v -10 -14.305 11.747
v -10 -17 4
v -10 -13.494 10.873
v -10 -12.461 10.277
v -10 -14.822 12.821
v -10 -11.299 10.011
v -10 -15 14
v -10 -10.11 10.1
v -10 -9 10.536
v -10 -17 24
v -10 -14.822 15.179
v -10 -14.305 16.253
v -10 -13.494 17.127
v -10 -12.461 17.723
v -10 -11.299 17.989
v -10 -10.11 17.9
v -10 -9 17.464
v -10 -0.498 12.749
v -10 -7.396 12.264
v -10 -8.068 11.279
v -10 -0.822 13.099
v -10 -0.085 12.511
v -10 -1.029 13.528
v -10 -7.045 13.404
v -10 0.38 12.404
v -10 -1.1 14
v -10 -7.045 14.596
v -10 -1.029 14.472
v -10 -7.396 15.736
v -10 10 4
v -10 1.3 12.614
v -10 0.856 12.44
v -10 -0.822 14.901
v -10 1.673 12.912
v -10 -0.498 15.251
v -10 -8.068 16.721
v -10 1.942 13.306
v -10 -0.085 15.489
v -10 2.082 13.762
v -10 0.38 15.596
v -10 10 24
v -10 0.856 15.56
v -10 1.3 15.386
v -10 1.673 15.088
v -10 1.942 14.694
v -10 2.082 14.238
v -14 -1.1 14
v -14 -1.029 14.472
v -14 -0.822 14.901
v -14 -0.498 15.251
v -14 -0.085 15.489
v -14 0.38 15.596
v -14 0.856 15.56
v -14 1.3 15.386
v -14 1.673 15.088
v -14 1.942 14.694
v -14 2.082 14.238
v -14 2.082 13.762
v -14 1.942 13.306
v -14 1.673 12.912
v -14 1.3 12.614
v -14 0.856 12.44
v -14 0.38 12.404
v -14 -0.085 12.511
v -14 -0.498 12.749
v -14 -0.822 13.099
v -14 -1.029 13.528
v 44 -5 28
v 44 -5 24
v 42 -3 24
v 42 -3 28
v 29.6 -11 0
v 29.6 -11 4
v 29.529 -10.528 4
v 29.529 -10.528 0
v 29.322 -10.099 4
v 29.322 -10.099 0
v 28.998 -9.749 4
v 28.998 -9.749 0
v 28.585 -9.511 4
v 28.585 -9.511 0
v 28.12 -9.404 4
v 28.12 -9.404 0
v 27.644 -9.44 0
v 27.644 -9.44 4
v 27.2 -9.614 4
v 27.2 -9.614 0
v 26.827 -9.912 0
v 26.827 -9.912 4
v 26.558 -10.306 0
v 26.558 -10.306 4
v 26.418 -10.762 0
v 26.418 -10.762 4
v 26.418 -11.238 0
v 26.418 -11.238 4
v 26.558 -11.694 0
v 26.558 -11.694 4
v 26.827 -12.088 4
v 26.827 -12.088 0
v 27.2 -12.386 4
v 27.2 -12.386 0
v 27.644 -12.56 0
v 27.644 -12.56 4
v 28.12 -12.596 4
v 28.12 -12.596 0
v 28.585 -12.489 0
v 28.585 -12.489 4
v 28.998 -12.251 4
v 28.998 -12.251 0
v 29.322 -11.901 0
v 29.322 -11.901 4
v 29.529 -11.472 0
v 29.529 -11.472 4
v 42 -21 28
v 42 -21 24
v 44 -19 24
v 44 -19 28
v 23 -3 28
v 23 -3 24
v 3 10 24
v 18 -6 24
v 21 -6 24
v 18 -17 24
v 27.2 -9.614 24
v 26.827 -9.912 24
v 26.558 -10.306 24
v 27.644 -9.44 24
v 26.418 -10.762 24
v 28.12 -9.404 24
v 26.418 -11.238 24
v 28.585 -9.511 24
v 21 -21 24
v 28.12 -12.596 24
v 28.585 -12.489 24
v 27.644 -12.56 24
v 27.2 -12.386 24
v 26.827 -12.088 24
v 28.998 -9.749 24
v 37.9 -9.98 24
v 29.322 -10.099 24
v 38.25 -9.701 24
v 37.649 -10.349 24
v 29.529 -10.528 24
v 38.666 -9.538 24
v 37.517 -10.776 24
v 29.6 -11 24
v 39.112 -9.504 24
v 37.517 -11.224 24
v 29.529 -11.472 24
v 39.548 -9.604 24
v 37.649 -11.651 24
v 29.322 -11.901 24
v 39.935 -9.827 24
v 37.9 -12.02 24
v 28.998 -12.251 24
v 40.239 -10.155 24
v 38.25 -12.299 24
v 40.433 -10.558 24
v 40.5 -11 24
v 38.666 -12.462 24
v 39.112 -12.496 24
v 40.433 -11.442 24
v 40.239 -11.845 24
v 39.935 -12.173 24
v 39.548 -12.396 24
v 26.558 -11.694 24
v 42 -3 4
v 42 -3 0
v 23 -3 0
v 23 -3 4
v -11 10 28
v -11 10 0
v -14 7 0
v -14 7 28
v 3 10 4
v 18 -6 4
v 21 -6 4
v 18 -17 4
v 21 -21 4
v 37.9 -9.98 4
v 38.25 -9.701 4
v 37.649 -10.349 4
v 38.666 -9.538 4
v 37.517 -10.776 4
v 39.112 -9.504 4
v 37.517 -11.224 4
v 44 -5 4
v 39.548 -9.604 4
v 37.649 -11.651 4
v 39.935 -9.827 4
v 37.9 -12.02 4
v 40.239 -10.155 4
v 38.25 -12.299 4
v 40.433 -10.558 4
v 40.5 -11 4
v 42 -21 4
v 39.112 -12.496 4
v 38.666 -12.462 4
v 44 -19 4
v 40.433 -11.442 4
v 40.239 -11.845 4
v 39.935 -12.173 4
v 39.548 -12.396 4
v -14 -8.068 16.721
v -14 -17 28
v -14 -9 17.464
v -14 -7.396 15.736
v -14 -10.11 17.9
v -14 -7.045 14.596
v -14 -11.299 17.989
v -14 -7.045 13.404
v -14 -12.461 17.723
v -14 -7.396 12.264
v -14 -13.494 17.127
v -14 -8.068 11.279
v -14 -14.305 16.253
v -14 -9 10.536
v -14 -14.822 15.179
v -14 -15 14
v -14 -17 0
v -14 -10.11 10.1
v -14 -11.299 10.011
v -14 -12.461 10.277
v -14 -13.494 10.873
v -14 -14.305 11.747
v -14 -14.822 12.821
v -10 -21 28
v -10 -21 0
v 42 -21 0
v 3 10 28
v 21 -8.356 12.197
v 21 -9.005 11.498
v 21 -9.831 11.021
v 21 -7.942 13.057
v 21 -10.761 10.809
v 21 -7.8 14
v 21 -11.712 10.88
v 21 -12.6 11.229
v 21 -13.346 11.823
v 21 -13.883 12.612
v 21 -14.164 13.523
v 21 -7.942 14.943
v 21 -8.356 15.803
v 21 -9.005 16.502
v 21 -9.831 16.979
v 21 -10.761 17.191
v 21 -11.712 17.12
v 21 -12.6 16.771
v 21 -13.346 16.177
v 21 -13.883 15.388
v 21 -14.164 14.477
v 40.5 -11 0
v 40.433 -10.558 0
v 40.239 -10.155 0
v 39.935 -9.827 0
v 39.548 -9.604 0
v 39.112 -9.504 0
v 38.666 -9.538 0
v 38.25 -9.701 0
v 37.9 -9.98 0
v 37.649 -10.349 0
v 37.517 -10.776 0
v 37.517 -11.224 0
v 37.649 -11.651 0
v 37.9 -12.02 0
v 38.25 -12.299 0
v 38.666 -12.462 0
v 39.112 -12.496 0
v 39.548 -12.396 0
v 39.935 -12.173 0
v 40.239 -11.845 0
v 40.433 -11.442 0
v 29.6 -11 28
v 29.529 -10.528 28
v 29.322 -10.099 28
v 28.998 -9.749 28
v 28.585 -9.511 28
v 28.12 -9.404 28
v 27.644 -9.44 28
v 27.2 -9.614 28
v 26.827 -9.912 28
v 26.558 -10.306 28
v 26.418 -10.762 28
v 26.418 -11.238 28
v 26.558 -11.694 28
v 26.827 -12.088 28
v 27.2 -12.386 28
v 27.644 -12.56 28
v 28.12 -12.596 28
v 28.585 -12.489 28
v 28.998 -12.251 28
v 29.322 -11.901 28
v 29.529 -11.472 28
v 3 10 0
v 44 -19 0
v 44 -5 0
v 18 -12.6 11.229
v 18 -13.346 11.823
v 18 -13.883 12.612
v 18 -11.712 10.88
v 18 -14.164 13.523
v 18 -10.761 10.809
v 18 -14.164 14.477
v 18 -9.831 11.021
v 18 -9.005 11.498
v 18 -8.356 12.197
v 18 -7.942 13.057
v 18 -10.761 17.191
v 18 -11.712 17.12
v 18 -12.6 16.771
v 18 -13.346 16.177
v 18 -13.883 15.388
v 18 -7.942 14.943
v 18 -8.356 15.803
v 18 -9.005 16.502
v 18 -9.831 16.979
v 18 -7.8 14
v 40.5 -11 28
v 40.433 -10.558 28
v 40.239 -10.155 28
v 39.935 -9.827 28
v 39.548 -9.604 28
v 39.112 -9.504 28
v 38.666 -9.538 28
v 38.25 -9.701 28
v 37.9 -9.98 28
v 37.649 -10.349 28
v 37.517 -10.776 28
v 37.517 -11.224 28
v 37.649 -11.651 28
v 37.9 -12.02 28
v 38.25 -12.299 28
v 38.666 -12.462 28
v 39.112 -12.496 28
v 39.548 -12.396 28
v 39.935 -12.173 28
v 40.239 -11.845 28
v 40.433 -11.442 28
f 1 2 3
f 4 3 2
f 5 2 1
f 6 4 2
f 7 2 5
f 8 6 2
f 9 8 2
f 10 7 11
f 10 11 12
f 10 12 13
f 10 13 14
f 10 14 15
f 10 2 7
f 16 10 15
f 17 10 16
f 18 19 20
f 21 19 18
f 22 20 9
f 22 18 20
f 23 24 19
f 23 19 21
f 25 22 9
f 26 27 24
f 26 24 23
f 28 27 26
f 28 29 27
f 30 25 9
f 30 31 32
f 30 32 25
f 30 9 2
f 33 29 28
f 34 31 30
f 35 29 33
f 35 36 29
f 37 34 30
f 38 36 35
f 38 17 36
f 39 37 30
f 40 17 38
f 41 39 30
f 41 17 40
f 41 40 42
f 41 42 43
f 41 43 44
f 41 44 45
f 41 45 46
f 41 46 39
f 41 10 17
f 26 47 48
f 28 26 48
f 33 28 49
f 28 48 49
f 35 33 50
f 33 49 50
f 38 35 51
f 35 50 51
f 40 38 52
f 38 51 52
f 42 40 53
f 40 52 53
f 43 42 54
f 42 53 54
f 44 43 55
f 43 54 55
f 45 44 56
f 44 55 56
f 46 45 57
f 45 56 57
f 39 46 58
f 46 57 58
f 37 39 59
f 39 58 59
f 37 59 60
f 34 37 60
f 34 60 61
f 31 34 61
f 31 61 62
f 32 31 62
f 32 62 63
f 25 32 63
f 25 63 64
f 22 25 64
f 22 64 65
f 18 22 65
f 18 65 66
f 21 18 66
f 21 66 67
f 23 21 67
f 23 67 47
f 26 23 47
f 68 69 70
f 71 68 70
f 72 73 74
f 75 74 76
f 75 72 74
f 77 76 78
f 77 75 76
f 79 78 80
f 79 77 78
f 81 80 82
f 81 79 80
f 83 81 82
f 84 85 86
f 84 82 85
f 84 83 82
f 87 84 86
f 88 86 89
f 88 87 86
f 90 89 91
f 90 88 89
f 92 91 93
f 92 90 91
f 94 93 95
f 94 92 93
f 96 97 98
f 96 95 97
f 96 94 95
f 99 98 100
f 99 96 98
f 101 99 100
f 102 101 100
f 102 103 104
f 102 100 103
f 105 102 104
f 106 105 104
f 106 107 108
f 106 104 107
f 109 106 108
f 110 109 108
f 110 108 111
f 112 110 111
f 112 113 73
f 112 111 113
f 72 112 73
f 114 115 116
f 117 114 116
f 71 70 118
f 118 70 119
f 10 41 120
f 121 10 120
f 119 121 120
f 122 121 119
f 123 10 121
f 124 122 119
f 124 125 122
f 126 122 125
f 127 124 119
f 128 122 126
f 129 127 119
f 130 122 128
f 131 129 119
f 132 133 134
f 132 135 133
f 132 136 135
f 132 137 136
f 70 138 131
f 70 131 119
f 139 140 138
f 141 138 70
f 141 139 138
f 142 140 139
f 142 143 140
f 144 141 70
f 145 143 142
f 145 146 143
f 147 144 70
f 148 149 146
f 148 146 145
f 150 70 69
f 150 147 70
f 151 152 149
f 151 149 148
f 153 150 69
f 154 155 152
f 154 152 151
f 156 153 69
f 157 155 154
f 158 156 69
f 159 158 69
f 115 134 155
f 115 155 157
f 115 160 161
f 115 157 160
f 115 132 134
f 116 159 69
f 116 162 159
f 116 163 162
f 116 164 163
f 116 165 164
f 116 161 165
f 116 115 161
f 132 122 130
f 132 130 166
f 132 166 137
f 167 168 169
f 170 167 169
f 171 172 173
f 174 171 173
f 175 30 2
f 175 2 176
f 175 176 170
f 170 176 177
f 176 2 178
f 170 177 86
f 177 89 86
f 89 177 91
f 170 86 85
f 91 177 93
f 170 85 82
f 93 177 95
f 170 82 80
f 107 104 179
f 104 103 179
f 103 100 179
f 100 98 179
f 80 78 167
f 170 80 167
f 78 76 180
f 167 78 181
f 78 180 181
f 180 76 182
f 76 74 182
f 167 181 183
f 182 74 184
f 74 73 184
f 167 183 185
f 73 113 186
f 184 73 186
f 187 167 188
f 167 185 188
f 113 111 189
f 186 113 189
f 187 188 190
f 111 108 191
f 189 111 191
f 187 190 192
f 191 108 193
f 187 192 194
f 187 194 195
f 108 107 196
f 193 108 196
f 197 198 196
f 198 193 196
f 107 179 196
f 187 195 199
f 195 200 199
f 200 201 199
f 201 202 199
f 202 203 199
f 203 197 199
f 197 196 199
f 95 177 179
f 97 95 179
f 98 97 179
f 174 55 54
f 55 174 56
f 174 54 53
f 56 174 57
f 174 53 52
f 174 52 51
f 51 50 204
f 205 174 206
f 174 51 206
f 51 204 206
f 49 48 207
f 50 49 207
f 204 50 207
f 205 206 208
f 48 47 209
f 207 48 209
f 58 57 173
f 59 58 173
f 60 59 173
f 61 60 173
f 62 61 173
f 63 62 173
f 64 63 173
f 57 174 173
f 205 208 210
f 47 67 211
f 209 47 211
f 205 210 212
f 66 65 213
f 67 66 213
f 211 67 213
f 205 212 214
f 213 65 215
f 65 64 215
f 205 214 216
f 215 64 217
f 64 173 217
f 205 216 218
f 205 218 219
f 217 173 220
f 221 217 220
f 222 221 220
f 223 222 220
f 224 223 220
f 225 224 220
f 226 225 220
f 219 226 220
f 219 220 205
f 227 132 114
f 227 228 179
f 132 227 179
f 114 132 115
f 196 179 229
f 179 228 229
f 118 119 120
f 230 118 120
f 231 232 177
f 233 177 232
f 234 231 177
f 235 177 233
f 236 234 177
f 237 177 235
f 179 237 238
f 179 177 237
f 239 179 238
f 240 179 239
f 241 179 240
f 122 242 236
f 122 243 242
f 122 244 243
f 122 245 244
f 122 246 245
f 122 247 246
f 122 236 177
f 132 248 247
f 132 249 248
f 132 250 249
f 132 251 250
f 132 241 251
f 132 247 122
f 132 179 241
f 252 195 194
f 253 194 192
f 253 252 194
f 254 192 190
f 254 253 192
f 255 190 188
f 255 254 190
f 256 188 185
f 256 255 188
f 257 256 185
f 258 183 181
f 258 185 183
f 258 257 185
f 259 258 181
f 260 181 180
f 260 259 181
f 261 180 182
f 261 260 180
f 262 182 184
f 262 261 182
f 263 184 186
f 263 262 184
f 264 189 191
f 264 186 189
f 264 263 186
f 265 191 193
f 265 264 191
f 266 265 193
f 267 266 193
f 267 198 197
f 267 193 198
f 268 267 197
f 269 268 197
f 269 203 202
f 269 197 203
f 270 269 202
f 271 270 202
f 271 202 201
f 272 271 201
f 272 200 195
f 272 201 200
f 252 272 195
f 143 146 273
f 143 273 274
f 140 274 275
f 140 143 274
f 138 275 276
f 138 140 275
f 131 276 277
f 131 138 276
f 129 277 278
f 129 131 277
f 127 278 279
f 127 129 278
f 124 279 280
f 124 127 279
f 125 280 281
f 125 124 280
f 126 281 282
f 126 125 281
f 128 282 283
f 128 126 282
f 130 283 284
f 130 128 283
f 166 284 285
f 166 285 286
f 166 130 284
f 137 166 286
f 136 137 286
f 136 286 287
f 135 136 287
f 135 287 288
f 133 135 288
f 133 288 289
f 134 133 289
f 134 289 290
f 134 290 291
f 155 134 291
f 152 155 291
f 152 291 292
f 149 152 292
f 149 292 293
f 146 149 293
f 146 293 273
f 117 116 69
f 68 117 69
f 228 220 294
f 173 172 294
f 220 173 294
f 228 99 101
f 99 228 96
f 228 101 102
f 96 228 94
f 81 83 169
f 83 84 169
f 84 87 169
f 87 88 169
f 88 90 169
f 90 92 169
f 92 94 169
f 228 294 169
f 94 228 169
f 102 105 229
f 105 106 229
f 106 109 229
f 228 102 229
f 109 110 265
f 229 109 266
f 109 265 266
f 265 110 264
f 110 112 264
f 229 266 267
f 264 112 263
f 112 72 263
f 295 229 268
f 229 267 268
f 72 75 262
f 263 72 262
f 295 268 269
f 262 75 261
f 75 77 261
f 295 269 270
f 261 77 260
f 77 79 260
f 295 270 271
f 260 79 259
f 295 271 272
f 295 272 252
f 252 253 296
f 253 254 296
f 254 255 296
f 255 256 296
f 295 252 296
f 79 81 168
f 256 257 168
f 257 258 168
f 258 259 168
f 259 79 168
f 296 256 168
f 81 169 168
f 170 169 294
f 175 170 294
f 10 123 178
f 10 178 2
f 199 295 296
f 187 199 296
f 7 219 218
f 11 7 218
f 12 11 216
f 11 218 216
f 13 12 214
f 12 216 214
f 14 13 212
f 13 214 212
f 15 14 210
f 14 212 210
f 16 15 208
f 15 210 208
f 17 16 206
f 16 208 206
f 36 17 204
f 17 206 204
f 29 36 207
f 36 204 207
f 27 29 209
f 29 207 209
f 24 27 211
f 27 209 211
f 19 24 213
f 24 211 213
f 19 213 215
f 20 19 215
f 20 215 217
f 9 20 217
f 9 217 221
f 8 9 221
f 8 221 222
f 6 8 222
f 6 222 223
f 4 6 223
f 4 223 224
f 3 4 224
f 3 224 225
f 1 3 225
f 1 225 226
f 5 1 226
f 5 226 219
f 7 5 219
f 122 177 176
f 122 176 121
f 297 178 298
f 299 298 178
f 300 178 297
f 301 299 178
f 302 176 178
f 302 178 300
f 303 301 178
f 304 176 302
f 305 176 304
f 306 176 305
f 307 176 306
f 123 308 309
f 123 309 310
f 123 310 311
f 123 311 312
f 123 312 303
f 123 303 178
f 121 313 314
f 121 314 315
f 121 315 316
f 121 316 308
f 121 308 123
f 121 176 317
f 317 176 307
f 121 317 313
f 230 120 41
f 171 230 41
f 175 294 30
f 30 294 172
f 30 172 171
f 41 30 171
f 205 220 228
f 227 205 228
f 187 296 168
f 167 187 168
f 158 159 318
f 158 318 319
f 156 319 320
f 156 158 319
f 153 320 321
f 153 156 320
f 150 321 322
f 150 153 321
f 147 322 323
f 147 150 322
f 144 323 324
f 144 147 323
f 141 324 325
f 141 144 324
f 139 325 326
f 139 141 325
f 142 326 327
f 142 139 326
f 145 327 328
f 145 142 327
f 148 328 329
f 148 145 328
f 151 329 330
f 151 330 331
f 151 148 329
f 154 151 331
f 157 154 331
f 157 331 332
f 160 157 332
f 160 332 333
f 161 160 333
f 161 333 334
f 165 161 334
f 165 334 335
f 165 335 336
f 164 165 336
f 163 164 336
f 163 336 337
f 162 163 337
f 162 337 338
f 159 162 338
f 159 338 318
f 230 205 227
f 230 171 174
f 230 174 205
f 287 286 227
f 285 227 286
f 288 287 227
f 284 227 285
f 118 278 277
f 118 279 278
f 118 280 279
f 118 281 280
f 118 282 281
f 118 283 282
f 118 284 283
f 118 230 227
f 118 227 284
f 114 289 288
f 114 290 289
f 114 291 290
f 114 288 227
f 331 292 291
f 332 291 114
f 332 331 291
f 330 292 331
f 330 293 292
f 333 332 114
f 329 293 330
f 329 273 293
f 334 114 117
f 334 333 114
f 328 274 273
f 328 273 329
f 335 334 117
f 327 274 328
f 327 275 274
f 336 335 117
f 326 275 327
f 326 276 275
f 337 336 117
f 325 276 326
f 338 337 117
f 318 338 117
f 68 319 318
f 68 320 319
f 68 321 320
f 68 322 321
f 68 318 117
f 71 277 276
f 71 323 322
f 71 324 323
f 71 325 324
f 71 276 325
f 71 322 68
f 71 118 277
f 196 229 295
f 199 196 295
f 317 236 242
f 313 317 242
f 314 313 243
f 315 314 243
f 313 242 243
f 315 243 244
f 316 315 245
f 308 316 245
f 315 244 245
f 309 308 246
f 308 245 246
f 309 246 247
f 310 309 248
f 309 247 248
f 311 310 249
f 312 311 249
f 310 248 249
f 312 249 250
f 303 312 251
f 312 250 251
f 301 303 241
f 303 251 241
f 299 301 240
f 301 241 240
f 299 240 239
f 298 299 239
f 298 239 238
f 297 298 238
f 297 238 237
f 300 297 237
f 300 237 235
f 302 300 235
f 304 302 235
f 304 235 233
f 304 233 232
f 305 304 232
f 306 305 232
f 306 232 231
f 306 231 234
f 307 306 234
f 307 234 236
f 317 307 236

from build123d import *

# Parameters (mm, degrees)
SKETCH008_R     = 1.6
SKETCH008_R_2   = 1.5
PAD002_DEPTH    = 28
SKETCH018_W     = 29
SKETCH018_H     = 20
POCKET011_DEPTH = 42
SKETCH020_W     = 23
SKETCH020_H     = 20
POCKET013_DEPTH = 31
SKETCH021_W     = 28
SKETCH021_H     = 20
POCKET014_DEPTH = 11
SKETCH022_R     = 3.2
POCKET015_DEPTH = 5
SKETCH023_R     = 4
SKETCH023_R_2   = 1.6
POCKET016_DEPTH = 5


with BuildPart() as part:
    # Sketch008 → Pad002 (new body)
    with BuildSketch(Plane.XY):
        Polygon((-14, -17), (-10, -21), (42, -21), (44, -19), (44, -5), (42, -3), (23, -3), (3, 10), (-11, 10), (-14, 7), align=None)
        with Locations((28, -11)):
            Circle(SKETCH008_R, mode=Mode.SUBTRACT)
        with Locations((39, -11)):
            Circle(SKETCH008_R_2, mode=Mode.SUBTRACT)
    extrude(amount=PAD002_DEPTH)

    # Sketch018 (on Face6 of Pad002) → Pocket011 (cut)
    with BuildSketch(Plane.XZ.offset(21)):
        with Locations((35.5, 14)):
            Rectangle(SKETCH018_W, SKETCH018_H)
    extrude(amount=-POCKET011_DEPTH, mode=Mode.SUBTRACT)

    # Sketch020 → Pocket013 (cut)
    with BuildSketch(Plane.YZ.offset(21)):
        with Locations((5.5, 14)):
            Rectangle(SKETCH020_W, SKETCH020_H)
    extrude(amount=-POCKET013_DEPTH, mode=Mode.SUBTRACT)

    # Sketch021 (on Face17 of Pocket013) → Pocket014 (cut)
    with BuildSketch(Plane(origin=(0, -6, 0), x_dir=(-1, 0, 0), z_dir=(0, 1, 0))):
        with Locations((-4, 14)):
            Rectangle(SKETCH021_W, SKETCH021_H)
    extrude(amount=-POCKET014_DEPTH, mode=Mode.SUBTRACT)

    # Sketch022 (on Face16 of Pocket014) → Pocket015 (cut)
    with BuildSketch(Plane.YZ.offset(21)):
        with Locations((-11, 14)):
            Circle(SKETCH022_R)
    extrude(amount=-POCKET015_DEPTH, mode=Mode.SUBTRACT)

    # Sketch023 (on Face7 of Pocket015) → Pocket016 (cut)
    with BuildSketch(Plane(origin=(-14, 0, 0), x_dir=(0, -1, 0), z_dir=(-1, 0, 0))):
        with Locations((11, 14)):
            Circle(SKETCH023_R)
        with Locations((-0.5, 14)):
            Circle(SKETCH023_R_2)
    extrude(amount=-POCKET016_DEPTH, mode=Mode.SUBTRACT)


solid = part.part
